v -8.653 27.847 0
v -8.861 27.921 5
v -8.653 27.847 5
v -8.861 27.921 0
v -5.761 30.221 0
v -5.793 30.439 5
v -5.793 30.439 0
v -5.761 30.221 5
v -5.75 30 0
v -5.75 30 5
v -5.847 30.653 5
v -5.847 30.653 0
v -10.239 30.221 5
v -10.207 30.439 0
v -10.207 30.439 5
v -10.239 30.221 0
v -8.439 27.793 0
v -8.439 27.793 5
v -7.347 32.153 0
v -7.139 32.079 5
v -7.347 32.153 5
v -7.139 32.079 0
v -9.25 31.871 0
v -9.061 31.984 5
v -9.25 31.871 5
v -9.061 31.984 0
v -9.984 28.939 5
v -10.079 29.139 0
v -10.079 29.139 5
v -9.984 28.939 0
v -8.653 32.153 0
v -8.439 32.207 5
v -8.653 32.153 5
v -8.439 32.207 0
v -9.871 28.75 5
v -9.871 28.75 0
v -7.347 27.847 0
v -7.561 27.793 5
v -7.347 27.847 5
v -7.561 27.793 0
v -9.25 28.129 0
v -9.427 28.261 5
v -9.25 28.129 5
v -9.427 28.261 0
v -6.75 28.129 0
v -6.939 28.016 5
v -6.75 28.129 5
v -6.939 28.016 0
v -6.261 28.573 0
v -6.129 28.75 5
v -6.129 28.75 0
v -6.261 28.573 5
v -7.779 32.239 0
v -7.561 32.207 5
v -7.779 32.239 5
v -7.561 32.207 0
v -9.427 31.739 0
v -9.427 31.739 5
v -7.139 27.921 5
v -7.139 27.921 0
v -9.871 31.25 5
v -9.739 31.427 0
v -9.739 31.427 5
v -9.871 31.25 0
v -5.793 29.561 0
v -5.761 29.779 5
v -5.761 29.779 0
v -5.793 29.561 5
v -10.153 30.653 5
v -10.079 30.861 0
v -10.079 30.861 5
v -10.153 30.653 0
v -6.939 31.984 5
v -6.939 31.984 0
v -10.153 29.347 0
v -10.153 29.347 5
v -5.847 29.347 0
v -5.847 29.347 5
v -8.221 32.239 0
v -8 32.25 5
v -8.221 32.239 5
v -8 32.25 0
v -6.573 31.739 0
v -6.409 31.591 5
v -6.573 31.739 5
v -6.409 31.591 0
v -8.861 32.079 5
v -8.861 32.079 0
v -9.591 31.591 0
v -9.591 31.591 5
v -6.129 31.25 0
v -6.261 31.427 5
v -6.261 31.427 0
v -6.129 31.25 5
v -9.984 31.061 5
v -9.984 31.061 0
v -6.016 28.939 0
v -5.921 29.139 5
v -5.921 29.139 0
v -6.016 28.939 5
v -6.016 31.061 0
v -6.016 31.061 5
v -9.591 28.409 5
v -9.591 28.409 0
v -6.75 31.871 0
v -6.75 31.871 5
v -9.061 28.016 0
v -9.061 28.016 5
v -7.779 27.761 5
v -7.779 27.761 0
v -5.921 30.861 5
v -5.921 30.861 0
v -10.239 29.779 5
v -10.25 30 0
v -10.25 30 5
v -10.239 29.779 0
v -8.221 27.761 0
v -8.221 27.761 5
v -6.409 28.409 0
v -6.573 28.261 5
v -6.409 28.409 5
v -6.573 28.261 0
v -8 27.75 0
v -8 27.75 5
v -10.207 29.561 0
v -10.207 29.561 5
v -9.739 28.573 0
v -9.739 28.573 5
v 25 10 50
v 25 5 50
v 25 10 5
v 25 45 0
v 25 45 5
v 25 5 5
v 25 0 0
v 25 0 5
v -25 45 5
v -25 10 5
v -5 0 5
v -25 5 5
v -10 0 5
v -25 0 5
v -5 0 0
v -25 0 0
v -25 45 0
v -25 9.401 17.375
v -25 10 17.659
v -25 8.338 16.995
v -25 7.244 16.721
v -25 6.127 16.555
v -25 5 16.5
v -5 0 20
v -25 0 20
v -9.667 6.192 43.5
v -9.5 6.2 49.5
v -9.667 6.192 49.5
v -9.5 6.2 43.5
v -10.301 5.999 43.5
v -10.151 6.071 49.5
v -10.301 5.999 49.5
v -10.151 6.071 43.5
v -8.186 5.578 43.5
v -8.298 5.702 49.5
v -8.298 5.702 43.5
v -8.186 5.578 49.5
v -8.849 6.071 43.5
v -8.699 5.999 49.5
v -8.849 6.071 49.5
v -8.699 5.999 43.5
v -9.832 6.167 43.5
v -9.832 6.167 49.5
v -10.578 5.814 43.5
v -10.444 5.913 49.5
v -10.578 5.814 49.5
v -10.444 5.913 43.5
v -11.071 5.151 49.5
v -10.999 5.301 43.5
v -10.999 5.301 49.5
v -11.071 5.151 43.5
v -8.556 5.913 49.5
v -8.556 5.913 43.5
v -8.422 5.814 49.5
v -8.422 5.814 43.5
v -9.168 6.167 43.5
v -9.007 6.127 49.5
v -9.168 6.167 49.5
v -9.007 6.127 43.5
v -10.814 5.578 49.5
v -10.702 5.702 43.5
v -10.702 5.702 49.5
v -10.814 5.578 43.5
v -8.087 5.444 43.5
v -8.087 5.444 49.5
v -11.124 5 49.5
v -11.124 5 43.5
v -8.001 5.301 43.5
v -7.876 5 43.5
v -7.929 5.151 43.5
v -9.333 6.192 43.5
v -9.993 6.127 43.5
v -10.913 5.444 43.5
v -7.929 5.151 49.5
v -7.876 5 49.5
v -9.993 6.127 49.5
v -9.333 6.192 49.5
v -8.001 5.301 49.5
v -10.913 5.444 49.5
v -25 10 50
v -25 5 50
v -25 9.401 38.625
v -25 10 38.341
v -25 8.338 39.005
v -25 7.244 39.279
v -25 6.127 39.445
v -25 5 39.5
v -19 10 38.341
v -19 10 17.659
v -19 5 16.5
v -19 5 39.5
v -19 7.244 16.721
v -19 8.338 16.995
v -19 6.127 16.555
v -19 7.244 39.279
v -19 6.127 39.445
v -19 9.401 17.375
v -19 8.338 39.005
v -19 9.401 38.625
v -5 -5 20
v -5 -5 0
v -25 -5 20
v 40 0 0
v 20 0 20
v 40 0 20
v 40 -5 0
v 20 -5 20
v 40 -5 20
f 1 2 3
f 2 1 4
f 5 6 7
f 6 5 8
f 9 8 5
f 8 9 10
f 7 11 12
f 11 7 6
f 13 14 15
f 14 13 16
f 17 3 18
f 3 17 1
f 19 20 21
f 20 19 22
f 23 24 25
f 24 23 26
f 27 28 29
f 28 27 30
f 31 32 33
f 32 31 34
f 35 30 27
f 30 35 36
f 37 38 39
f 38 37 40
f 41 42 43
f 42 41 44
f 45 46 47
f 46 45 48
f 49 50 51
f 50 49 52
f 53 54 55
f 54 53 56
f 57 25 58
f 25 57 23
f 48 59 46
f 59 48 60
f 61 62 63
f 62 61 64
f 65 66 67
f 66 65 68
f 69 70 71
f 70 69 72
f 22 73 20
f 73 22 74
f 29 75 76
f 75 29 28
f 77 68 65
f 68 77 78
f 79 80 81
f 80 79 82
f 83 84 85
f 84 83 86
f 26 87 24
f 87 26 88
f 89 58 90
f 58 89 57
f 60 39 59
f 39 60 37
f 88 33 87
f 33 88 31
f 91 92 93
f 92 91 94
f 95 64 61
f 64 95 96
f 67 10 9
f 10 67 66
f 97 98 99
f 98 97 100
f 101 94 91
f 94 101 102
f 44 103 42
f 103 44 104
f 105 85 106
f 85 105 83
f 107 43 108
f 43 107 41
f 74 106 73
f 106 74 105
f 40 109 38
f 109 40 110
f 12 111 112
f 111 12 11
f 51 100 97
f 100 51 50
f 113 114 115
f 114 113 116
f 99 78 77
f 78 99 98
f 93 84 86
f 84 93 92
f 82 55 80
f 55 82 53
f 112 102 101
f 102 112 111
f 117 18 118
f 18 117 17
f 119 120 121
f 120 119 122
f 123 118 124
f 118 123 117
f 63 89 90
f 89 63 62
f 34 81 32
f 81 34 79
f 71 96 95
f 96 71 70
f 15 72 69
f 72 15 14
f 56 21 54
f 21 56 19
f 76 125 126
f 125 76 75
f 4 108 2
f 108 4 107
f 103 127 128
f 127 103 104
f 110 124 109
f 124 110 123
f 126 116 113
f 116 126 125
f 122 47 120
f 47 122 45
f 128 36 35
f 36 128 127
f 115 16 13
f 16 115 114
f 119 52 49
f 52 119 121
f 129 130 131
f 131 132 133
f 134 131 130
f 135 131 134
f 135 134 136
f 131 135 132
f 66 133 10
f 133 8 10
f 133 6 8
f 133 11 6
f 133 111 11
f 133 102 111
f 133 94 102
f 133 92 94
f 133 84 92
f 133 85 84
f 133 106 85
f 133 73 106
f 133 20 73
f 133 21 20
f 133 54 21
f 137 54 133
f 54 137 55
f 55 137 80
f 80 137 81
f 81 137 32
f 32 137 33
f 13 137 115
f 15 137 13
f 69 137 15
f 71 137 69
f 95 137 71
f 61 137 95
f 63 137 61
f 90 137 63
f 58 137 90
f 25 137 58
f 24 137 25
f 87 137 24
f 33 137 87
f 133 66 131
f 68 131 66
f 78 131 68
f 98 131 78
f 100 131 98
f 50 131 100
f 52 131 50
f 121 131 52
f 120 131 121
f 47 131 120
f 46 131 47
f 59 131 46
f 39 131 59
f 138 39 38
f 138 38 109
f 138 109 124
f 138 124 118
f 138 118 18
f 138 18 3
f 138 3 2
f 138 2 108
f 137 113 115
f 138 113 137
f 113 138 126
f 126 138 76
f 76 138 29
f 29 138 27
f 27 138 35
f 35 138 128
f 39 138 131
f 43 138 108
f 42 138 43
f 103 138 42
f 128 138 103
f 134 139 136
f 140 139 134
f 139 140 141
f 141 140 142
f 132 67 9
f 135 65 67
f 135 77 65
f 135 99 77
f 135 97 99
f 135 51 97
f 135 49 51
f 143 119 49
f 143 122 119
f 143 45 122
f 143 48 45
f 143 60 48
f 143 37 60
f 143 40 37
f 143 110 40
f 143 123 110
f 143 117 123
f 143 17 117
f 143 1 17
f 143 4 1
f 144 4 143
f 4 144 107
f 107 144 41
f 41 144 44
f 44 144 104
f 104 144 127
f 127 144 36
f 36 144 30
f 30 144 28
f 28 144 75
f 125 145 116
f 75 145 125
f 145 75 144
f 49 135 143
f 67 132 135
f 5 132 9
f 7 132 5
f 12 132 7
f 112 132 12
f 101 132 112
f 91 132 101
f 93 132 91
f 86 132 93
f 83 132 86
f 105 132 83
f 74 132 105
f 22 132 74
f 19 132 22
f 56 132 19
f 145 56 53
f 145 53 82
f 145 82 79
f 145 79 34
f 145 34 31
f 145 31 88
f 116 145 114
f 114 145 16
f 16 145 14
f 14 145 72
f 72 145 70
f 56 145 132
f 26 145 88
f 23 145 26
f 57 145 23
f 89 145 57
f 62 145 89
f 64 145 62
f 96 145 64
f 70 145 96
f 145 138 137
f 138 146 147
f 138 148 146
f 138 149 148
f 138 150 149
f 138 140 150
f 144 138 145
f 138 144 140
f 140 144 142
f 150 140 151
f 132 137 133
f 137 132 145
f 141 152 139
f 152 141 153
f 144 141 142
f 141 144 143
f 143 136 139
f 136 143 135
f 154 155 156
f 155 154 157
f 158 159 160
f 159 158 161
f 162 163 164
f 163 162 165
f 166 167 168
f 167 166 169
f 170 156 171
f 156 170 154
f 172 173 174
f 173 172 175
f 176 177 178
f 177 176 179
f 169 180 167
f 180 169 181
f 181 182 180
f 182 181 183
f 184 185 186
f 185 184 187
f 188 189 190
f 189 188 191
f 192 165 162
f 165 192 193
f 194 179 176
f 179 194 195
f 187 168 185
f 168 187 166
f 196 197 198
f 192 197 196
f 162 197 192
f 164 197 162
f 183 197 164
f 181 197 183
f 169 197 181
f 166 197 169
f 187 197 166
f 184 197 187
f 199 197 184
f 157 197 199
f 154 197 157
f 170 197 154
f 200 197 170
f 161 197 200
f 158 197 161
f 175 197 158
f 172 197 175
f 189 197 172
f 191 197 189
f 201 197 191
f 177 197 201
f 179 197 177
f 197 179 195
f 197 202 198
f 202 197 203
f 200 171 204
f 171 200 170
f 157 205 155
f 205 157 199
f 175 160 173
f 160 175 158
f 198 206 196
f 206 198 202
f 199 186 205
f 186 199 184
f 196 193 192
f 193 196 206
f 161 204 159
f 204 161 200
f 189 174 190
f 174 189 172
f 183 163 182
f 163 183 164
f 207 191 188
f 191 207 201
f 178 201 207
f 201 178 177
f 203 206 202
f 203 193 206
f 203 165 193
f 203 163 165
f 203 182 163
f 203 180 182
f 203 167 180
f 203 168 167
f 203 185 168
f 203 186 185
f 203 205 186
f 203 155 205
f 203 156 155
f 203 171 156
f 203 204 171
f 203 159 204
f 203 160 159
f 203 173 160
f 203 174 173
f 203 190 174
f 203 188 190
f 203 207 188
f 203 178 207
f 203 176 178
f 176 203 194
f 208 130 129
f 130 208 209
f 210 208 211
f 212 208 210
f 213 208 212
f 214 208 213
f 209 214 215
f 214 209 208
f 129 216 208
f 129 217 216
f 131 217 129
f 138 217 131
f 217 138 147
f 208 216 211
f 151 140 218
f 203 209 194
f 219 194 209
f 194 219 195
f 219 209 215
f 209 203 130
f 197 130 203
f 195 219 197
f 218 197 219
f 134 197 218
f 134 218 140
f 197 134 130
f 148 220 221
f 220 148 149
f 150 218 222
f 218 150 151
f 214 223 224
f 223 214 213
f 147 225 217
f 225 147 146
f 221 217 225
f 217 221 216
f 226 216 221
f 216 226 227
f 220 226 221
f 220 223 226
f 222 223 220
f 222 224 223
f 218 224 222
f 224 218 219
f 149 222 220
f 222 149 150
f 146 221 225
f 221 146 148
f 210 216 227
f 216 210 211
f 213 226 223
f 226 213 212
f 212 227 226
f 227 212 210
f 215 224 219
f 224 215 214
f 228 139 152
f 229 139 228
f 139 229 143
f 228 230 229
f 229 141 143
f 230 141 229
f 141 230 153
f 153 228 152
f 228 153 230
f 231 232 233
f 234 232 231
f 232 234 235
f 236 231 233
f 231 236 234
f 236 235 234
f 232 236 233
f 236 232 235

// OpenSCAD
// L-shaped mounting bracket for a NEMA 17 stepper motor (e.g. for a syringe pump)
// Print orientation: base plate lies on the bed (z = 0), motor plate builds upward.

// ---------------- Parameters ----------------
$fn = 64;                 // curve resolution

// Base plate
base_x0 = -25;            // plate left edge (X)
base_x1 = 25;             // plate right edge (X)
base_y0 = 0;              // plate front edge (Y)
base_y1 = 45;             // plate back edge (Y)
base_z1 = 5;              // plate top height (Z)
bolt_d = 4.5;             // M4 through-hole diameter
bolt_x = -17;             // hole X offset from plate left edge
bolt_y = 30;              // hole Y offset from plate front edge

// Motor plate
motor_x0 = -25;           // plate left edge (X)
motor_x1 = 25;            // plate right edge (X)
motor_y0 = 0;             // plate front edge (Y)
motor_y1 = 5;             // plate depth (Y), sits on base back edge
motor_z1 = 50;            // plate top height (Z)
boss_d = 23;              // motor centring boss hole diameter
boss_x = 0;               // boss hole centre X
boss_z = 28;              // boss hole centre Z
screw_d = 3.4;            // M3 screw hole diameter
screw_pitch = 31;         // square pattern side length
screw_count = 4;          // number of screw holes

// Gussets
gusset_t = 5;             // gusset thickness (X)
gusset_y = 20;            // gusset leg along +Y
gusset_z = 20;            // gusset leg along +Z

eps = 0.5;                // cutter overshoot past faces

// ---------------- Model ----------------
union() {
    // Base plate with two vertical M4 through-holes
    translate([base_x0, base_y0, 0])
        difference() {
            cube([base_x1 - base_x0, base_y1 - base_y0, base_z1]);
            for (sx = [-1, 1])
                translate([sx * bolt_x, bolt_y, -eps])
                    cylinder(d = bolt_d, h = base_z1 + 2 * eps);
        }

    // Motor plate standing on the back edge of the base
    translate([motor_x0, motor_y1 - motor_y0, 0])
        difference() {
            cube([motor_x1 - motor_x0, motor_y1 - motor_y0, motor_z1]);
            // Boss hole (along Y), centred at given X and Z
            translate([boss_x, 0, boss_z])
                rotate([0, 90, 0])
                    cylinder(d = boss_d, h = motor_y1 - motor_y0 + 2 * eps);
            // M3 screw holes on a square pattern centred on the boss hole
            for (i = [0 : screw_count - 1]) {
                a = (i - (screw_count - 1) / 2) * screw_pitch;
                translate([boss_x + a, -eps, boss_z + a])
                    cylinder(d = screw_d, h = motor_y1 - motor_y0 + 2 * eps);
            }
        }

    // Triangular gussets, flush with the left and right edges
    for (gx = [motor_x0, motor_x1 - gusset_t]) {
        translate([gx, motor_y0, 0])
            rotate([90, 0, 0])
                linear_extrude(height = gusset_t)
                    polygon(points = [
                        [gusset_y, gusset_z],   // right-angle corner at y = 5, z = 5
                        [gusset_y, 0],
                        [0, gusset_z]
                    ]);
    }
}
